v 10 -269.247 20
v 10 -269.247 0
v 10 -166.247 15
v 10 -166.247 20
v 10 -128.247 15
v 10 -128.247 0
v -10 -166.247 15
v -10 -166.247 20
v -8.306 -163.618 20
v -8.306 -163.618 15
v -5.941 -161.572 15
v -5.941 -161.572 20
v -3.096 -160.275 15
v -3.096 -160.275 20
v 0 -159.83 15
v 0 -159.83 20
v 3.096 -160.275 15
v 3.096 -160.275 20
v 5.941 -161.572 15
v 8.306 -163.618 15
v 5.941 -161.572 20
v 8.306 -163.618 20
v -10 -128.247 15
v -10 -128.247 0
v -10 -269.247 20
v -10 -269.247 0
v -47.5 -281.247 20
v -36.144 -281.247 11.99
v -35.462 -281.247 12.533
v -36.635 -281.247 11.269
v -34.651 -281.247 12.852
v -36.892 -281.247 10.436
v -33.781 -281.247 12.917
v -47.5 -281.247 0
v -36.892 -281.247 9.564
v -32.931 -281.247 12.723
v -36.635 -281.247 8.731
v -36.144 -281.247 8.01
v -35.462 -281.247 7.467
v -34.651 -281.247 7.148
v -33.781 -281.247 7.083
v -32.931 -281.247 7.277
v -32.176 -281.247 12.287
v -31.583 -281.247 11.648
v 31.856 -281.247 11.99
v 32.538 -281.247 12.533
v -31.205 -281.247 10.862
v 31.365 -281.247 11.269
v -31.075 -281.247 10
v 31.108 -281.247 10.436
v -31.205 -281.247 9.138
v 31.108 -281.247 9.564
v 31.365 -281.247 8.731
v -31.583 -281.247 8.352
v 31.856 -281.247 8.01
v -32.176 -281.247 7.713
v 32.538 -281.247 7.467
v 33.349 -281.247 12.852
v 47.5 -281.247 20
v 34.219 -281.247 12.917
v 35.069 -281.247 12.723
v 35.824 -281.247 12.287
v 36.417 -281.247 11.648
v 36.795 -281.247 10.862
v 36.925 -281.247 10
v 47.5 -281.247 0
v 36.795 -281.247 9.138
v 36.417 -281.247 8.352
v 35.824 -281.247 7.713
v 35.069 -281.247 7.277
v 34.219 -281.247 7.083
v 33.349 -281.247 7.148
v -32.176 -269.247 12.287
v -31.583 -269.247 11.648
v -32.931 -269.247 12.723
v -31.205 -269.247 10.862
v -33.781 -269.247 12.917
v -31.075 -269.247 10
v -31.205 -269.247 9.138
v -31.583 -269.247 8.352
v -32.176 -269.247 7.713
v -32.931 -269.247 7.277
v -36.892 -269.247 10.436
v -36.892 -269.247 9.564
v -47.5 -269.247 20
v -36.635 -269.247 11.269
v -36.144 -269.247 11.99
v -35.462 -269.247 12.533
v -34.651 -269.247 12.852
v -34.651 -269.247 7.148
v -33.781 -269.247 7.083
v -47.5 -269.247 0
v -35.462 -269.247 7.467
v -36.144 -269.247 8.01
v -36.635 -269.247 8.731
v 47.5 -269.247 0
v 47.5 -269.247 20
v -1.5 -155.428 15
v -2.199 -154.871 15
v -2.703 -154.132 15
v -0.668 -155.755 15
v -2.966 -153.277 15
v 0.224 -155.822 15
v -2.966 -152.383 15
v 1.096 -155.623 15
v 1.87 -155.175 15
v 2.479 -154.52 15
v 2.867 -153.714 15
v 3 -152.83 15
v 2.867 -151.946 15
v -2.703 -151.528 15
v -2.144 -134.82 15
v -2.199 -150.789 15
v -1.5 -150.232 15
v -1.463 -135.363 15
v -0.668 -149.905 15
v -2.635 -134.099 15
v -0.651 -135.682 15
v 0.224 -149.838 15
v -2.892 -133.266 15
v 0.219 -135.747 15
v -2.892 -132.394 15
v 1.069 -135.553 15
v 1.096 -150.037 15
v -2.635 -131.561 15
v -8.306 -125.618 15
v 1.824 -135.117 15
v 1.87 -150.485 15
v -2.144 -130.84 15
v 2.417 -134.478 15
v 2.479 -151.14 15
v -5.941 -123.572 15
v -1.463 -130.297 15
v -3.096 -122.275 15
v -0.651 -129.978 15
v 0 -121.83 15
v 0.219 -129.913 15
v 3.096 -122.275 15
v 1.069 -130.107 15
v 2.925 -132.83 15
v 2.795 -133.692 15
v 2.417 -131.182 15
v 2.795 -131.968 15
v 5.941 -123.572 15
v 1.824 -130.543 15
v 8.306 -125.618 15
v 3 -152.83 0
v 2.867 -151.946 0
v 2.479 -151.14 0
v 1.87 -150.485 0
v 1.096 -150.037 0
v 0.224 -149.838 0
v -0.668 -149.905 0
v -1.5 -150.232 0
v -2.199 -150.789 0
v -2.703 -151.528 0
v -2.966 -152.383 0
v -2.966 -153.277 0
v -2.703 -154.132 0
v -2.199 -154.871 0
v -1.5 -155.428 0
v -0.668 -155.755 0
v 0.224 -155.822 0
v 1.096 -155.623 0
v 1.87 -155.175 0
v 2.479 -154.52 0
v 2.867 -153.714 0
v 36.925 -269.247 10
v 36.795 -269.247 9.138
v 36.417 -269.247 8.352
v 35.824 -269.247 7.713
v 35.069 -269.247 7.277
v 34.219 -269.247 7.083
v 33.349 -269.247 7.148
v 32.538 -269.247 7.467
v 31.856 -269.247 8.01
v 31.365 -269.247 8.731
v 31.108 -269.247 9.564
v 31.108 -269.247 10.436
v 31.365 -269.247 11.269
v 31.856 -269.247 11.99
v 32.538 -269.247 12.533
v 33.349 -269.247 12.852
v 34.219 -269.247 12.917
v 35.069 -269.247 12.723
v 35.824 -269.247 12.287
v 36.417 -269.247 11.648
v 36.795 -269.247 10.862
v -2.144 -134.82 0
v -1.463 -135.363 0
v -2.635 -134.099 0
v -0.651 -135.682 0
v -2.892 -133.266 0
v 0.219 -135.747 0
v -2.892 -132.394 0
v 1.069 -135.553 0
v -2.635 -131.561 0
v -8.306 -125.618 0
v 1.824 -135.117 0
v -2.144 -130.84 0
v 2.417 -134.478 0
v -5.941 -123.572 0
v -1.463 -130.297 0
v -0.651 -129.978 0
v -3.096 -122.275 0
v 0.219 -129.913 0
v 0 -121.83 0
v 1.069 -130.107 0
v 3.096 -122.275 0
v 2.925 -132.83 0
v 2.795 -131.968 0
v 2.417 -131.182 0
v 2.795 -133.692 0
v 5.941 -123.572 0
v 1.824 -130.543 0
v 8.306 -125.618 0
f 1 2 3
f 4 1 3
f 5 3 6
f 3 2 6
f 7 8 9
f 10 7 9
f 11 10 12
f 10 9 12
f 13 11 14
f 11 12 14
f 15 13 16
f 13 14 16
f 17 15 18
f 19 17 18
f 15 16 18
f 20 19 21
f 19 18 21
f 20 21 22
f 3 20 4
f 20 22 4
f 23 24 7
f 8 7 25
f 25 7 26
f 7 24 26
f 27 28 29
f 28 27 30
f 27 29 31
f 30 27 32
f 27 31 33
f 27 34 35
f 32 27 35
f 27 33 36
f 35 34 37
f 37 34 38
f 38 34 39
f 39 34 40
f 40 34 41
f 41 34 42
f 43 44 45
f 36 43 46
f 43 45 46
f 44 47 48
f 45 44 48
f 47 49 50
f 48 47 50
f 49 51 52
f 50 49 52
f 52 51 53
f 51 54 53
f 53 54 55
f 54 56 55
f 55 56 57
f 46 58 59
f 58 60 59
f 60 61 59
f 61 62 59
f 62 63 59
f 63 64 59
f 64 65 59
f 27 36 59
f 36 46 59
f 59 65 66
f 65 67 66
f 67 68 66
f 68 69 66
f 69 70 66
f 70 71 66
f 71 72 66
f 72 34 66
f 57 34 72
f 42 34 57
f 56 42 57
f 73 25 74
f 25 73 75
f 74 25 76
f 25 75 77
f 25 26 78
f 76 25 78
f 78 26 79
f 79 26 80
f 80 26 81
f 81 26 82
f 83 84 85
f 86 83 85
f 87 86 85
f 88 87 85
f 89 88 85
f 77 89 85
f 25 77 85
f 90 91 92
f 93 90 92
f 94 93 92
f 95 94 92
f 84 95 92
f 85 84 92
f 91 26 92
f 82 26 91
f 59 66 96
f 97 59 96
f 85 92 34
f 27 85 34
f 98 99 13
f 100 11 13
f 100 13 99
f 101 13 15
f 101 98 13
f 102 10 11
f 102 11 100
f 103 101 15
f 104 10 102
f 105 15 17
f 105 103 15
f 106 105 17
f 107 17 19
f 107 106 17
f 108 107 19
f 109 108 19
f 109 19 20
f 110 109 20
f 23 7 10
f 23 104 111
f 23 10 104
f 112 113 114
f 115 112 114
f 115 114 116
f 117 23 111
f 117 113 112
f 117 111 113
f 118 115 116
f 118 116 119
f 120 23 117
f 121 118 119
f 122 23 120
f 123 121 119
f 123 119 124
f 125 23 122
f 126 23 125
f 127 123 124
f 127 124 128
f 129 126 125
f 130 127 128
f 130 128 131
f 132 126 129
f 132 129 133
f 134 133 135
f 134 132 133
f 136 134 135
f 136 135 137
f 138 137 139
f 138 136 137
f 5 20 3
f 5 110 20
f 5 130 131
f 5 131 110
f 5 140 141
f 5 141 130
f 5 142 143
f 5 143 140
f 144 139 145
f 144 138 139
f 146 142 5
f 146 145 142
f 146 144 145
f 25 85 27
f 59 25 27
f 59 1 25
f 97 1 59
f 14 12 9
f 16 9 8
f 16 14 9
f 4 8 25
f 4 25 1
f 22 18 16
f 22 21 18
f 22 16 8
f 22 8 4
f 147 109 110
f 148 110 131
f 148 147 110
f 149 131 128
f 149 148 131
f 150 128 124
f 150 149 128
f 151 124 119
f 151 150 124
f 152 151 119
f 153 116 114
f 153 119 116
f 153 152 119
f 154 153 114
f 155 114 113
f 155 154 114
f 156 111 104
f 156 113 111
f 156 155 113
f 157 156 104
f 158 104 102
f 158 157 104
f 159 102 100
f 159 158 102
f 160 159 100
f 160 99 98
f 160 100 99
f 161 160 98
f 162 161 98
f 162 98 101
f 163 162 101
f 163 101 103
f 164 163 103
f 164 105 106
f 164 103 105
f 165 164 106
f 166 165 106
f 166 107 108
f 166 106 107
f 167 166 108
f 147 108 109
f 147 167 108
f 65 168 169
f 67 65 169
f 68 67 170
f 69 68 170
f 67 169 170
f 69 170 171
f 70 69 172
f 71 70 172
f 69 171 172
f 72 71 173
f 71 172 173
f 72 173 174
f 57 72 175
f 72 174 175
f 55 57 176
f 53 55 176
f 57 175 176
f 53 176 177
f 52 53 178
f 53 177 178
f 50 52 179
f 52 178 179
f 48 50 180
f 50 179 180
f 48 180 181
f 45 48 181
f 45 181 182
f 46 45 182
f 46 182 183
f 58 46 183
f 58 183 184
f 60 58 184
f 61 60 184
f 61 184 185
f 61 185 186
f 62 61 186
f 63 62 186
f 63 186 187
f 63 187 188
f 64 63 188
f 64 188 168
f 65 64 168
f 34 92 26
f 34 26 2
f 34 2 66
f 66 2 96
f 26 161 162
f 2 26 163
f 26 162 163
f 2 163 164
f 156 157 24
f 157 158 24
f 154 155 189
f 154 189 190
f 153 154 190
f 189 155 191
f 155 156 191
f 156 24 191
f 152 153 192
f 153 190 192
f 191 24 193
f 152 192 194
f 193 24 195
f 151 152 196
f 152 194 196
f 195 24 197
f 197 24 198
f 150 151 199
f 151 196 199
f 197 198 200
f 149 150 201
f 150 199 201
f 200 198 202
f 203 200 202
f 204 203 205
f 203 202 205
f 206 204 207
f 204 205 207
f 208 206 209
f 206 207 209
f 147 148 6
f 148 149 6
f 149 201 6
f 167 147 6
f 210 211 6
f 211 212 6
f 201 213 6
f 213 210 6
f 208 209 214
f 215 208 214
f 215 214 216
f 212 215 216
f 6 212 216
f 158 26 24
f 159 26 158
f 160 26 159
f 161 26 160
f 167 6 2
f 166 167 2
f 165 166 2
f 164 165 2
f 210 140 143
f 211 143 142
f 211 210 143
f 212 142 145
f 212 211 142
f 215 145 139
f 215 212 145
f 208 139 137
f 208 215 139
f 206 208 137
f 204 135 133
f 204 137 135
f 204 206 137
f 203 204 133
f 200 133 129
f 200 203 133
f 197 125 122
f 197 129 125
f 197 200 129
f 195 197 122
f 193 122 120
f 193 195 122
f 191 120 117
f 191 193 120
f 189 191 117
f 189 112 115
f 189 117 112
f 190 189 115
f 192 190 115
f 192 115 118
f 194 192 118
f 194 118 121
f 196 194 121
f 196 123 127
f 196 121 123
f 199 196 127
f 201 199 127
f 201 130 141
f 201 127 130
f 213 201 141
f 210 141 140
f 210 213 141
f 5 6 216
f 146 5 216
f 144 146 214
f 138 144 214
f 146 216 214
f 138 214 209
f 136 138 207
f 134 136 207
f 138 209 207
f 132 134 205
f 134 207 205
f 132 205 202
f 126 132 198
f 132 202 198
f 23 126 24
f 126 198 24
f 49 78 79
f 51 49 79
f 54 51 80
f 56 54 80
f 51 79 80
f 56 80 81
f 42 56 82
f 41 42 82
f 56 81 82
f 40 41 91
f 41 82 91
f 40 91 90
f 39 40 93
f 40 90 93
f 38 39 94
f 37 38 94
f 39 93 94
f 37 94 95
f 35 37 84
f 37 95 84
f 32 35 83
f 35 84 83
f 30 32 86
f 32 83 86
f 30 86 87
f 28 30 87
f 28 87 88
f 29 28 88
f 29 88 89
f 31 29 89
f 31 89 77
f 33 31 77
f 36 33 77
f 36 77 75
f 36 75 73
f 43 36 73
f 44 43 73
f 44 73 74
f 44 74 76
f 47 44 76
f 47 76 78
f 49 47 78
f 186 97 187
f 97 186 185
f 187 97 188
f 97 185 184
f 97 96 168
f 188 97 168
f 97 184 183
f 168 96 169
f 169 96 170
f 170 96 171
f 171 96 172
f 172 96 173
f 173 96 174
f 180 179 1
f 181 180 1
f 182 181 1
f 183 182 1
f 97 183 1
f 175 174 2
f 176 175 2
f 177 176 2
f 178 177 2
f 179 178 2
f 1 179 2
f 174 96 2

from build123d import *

# Parameters (mm, degrees)
SKETCH1_R           = 3
SKETCH1_R_2         = 2.925
BOSS_EXTRUDE1_DEPTH = 20
CUT_EXTRUDE1_DEPTH  = 5
SKETCH3_R           = 2.925
CUT_EXTRUDE2_DEPTH  = 13


with BuildPart() as part:
    # Sketch1 → Boss-Extrude1 (new body)
    with BuildSketch(Plane.XY):
        with BuildLine():
            Line((-10, -128.247424305), (-10, -269.247424305))
            Line((-10, -269.247424305), (-47.5, -269.247424305))
            Line((-47.5, -269.247424305), (-47.5, -281.247424305))
            Line((-47.5, -281.247424305), (47.5, -281.247424305))
            Line((47.5, -281.247424305), (47.5, -269.247424305))
            Line((47.5, -269.247424305), (10, -269.247424305))
            Line((10, -269.247424305), (10, -128.247424305))
            ThreePointArc((10, -128.247424305), (0, -121.83), (-10, -128.247424305))
        make_face()
        with Locations((0, -152.83)):
            Circle(SKETCH1_R, mode=Mode.SUBTRACT)
        with Locations((0, -132.83)):
            Circle(SKETCH1_R_2, mode=Mode.SUBTRACT)
    extrude(amount=BOSS_EXTRUDE1_DEPTH)

    # Sketch2 → Cut-Extrude1 (cut)
    with BuildSketch(Plane.XY.offset(20)):
        with BuildLine():
            Line((-10, -128.247424305), (-10, -166.247424305))
            ThreePointArc((-10, -166.247424305), (0, -159.83), (10, -166.247424305))
            Line((10, -166.247424305), (10, -128.247424305))
            ThreePointArc((10, -128.247424305), (0, -121.83), (-10, -128.247424305))
        make_face()
    extrude(amount=-CUT_EXTRUDE1_DEPTH, mode=Mode.SUBTRACT)

    # Sketch3 → Cut-Extrude2 (cut, through all)
    with BuildSketch(Plane(origin=(0, -269.247424305, 0), x_dir=(1, 0, 0), z_dir=(0, 1, 0))):
        with Locations((-34, -10)):
            Circle(SKETCH3_R)
        with Locations((34, -10)):
            Circle(SKETCH3_R)
    extrude(amount=-CUT_EXTRUDE2_DEPTH, mode=Mode.SUBTRACT)


solid = part.part
